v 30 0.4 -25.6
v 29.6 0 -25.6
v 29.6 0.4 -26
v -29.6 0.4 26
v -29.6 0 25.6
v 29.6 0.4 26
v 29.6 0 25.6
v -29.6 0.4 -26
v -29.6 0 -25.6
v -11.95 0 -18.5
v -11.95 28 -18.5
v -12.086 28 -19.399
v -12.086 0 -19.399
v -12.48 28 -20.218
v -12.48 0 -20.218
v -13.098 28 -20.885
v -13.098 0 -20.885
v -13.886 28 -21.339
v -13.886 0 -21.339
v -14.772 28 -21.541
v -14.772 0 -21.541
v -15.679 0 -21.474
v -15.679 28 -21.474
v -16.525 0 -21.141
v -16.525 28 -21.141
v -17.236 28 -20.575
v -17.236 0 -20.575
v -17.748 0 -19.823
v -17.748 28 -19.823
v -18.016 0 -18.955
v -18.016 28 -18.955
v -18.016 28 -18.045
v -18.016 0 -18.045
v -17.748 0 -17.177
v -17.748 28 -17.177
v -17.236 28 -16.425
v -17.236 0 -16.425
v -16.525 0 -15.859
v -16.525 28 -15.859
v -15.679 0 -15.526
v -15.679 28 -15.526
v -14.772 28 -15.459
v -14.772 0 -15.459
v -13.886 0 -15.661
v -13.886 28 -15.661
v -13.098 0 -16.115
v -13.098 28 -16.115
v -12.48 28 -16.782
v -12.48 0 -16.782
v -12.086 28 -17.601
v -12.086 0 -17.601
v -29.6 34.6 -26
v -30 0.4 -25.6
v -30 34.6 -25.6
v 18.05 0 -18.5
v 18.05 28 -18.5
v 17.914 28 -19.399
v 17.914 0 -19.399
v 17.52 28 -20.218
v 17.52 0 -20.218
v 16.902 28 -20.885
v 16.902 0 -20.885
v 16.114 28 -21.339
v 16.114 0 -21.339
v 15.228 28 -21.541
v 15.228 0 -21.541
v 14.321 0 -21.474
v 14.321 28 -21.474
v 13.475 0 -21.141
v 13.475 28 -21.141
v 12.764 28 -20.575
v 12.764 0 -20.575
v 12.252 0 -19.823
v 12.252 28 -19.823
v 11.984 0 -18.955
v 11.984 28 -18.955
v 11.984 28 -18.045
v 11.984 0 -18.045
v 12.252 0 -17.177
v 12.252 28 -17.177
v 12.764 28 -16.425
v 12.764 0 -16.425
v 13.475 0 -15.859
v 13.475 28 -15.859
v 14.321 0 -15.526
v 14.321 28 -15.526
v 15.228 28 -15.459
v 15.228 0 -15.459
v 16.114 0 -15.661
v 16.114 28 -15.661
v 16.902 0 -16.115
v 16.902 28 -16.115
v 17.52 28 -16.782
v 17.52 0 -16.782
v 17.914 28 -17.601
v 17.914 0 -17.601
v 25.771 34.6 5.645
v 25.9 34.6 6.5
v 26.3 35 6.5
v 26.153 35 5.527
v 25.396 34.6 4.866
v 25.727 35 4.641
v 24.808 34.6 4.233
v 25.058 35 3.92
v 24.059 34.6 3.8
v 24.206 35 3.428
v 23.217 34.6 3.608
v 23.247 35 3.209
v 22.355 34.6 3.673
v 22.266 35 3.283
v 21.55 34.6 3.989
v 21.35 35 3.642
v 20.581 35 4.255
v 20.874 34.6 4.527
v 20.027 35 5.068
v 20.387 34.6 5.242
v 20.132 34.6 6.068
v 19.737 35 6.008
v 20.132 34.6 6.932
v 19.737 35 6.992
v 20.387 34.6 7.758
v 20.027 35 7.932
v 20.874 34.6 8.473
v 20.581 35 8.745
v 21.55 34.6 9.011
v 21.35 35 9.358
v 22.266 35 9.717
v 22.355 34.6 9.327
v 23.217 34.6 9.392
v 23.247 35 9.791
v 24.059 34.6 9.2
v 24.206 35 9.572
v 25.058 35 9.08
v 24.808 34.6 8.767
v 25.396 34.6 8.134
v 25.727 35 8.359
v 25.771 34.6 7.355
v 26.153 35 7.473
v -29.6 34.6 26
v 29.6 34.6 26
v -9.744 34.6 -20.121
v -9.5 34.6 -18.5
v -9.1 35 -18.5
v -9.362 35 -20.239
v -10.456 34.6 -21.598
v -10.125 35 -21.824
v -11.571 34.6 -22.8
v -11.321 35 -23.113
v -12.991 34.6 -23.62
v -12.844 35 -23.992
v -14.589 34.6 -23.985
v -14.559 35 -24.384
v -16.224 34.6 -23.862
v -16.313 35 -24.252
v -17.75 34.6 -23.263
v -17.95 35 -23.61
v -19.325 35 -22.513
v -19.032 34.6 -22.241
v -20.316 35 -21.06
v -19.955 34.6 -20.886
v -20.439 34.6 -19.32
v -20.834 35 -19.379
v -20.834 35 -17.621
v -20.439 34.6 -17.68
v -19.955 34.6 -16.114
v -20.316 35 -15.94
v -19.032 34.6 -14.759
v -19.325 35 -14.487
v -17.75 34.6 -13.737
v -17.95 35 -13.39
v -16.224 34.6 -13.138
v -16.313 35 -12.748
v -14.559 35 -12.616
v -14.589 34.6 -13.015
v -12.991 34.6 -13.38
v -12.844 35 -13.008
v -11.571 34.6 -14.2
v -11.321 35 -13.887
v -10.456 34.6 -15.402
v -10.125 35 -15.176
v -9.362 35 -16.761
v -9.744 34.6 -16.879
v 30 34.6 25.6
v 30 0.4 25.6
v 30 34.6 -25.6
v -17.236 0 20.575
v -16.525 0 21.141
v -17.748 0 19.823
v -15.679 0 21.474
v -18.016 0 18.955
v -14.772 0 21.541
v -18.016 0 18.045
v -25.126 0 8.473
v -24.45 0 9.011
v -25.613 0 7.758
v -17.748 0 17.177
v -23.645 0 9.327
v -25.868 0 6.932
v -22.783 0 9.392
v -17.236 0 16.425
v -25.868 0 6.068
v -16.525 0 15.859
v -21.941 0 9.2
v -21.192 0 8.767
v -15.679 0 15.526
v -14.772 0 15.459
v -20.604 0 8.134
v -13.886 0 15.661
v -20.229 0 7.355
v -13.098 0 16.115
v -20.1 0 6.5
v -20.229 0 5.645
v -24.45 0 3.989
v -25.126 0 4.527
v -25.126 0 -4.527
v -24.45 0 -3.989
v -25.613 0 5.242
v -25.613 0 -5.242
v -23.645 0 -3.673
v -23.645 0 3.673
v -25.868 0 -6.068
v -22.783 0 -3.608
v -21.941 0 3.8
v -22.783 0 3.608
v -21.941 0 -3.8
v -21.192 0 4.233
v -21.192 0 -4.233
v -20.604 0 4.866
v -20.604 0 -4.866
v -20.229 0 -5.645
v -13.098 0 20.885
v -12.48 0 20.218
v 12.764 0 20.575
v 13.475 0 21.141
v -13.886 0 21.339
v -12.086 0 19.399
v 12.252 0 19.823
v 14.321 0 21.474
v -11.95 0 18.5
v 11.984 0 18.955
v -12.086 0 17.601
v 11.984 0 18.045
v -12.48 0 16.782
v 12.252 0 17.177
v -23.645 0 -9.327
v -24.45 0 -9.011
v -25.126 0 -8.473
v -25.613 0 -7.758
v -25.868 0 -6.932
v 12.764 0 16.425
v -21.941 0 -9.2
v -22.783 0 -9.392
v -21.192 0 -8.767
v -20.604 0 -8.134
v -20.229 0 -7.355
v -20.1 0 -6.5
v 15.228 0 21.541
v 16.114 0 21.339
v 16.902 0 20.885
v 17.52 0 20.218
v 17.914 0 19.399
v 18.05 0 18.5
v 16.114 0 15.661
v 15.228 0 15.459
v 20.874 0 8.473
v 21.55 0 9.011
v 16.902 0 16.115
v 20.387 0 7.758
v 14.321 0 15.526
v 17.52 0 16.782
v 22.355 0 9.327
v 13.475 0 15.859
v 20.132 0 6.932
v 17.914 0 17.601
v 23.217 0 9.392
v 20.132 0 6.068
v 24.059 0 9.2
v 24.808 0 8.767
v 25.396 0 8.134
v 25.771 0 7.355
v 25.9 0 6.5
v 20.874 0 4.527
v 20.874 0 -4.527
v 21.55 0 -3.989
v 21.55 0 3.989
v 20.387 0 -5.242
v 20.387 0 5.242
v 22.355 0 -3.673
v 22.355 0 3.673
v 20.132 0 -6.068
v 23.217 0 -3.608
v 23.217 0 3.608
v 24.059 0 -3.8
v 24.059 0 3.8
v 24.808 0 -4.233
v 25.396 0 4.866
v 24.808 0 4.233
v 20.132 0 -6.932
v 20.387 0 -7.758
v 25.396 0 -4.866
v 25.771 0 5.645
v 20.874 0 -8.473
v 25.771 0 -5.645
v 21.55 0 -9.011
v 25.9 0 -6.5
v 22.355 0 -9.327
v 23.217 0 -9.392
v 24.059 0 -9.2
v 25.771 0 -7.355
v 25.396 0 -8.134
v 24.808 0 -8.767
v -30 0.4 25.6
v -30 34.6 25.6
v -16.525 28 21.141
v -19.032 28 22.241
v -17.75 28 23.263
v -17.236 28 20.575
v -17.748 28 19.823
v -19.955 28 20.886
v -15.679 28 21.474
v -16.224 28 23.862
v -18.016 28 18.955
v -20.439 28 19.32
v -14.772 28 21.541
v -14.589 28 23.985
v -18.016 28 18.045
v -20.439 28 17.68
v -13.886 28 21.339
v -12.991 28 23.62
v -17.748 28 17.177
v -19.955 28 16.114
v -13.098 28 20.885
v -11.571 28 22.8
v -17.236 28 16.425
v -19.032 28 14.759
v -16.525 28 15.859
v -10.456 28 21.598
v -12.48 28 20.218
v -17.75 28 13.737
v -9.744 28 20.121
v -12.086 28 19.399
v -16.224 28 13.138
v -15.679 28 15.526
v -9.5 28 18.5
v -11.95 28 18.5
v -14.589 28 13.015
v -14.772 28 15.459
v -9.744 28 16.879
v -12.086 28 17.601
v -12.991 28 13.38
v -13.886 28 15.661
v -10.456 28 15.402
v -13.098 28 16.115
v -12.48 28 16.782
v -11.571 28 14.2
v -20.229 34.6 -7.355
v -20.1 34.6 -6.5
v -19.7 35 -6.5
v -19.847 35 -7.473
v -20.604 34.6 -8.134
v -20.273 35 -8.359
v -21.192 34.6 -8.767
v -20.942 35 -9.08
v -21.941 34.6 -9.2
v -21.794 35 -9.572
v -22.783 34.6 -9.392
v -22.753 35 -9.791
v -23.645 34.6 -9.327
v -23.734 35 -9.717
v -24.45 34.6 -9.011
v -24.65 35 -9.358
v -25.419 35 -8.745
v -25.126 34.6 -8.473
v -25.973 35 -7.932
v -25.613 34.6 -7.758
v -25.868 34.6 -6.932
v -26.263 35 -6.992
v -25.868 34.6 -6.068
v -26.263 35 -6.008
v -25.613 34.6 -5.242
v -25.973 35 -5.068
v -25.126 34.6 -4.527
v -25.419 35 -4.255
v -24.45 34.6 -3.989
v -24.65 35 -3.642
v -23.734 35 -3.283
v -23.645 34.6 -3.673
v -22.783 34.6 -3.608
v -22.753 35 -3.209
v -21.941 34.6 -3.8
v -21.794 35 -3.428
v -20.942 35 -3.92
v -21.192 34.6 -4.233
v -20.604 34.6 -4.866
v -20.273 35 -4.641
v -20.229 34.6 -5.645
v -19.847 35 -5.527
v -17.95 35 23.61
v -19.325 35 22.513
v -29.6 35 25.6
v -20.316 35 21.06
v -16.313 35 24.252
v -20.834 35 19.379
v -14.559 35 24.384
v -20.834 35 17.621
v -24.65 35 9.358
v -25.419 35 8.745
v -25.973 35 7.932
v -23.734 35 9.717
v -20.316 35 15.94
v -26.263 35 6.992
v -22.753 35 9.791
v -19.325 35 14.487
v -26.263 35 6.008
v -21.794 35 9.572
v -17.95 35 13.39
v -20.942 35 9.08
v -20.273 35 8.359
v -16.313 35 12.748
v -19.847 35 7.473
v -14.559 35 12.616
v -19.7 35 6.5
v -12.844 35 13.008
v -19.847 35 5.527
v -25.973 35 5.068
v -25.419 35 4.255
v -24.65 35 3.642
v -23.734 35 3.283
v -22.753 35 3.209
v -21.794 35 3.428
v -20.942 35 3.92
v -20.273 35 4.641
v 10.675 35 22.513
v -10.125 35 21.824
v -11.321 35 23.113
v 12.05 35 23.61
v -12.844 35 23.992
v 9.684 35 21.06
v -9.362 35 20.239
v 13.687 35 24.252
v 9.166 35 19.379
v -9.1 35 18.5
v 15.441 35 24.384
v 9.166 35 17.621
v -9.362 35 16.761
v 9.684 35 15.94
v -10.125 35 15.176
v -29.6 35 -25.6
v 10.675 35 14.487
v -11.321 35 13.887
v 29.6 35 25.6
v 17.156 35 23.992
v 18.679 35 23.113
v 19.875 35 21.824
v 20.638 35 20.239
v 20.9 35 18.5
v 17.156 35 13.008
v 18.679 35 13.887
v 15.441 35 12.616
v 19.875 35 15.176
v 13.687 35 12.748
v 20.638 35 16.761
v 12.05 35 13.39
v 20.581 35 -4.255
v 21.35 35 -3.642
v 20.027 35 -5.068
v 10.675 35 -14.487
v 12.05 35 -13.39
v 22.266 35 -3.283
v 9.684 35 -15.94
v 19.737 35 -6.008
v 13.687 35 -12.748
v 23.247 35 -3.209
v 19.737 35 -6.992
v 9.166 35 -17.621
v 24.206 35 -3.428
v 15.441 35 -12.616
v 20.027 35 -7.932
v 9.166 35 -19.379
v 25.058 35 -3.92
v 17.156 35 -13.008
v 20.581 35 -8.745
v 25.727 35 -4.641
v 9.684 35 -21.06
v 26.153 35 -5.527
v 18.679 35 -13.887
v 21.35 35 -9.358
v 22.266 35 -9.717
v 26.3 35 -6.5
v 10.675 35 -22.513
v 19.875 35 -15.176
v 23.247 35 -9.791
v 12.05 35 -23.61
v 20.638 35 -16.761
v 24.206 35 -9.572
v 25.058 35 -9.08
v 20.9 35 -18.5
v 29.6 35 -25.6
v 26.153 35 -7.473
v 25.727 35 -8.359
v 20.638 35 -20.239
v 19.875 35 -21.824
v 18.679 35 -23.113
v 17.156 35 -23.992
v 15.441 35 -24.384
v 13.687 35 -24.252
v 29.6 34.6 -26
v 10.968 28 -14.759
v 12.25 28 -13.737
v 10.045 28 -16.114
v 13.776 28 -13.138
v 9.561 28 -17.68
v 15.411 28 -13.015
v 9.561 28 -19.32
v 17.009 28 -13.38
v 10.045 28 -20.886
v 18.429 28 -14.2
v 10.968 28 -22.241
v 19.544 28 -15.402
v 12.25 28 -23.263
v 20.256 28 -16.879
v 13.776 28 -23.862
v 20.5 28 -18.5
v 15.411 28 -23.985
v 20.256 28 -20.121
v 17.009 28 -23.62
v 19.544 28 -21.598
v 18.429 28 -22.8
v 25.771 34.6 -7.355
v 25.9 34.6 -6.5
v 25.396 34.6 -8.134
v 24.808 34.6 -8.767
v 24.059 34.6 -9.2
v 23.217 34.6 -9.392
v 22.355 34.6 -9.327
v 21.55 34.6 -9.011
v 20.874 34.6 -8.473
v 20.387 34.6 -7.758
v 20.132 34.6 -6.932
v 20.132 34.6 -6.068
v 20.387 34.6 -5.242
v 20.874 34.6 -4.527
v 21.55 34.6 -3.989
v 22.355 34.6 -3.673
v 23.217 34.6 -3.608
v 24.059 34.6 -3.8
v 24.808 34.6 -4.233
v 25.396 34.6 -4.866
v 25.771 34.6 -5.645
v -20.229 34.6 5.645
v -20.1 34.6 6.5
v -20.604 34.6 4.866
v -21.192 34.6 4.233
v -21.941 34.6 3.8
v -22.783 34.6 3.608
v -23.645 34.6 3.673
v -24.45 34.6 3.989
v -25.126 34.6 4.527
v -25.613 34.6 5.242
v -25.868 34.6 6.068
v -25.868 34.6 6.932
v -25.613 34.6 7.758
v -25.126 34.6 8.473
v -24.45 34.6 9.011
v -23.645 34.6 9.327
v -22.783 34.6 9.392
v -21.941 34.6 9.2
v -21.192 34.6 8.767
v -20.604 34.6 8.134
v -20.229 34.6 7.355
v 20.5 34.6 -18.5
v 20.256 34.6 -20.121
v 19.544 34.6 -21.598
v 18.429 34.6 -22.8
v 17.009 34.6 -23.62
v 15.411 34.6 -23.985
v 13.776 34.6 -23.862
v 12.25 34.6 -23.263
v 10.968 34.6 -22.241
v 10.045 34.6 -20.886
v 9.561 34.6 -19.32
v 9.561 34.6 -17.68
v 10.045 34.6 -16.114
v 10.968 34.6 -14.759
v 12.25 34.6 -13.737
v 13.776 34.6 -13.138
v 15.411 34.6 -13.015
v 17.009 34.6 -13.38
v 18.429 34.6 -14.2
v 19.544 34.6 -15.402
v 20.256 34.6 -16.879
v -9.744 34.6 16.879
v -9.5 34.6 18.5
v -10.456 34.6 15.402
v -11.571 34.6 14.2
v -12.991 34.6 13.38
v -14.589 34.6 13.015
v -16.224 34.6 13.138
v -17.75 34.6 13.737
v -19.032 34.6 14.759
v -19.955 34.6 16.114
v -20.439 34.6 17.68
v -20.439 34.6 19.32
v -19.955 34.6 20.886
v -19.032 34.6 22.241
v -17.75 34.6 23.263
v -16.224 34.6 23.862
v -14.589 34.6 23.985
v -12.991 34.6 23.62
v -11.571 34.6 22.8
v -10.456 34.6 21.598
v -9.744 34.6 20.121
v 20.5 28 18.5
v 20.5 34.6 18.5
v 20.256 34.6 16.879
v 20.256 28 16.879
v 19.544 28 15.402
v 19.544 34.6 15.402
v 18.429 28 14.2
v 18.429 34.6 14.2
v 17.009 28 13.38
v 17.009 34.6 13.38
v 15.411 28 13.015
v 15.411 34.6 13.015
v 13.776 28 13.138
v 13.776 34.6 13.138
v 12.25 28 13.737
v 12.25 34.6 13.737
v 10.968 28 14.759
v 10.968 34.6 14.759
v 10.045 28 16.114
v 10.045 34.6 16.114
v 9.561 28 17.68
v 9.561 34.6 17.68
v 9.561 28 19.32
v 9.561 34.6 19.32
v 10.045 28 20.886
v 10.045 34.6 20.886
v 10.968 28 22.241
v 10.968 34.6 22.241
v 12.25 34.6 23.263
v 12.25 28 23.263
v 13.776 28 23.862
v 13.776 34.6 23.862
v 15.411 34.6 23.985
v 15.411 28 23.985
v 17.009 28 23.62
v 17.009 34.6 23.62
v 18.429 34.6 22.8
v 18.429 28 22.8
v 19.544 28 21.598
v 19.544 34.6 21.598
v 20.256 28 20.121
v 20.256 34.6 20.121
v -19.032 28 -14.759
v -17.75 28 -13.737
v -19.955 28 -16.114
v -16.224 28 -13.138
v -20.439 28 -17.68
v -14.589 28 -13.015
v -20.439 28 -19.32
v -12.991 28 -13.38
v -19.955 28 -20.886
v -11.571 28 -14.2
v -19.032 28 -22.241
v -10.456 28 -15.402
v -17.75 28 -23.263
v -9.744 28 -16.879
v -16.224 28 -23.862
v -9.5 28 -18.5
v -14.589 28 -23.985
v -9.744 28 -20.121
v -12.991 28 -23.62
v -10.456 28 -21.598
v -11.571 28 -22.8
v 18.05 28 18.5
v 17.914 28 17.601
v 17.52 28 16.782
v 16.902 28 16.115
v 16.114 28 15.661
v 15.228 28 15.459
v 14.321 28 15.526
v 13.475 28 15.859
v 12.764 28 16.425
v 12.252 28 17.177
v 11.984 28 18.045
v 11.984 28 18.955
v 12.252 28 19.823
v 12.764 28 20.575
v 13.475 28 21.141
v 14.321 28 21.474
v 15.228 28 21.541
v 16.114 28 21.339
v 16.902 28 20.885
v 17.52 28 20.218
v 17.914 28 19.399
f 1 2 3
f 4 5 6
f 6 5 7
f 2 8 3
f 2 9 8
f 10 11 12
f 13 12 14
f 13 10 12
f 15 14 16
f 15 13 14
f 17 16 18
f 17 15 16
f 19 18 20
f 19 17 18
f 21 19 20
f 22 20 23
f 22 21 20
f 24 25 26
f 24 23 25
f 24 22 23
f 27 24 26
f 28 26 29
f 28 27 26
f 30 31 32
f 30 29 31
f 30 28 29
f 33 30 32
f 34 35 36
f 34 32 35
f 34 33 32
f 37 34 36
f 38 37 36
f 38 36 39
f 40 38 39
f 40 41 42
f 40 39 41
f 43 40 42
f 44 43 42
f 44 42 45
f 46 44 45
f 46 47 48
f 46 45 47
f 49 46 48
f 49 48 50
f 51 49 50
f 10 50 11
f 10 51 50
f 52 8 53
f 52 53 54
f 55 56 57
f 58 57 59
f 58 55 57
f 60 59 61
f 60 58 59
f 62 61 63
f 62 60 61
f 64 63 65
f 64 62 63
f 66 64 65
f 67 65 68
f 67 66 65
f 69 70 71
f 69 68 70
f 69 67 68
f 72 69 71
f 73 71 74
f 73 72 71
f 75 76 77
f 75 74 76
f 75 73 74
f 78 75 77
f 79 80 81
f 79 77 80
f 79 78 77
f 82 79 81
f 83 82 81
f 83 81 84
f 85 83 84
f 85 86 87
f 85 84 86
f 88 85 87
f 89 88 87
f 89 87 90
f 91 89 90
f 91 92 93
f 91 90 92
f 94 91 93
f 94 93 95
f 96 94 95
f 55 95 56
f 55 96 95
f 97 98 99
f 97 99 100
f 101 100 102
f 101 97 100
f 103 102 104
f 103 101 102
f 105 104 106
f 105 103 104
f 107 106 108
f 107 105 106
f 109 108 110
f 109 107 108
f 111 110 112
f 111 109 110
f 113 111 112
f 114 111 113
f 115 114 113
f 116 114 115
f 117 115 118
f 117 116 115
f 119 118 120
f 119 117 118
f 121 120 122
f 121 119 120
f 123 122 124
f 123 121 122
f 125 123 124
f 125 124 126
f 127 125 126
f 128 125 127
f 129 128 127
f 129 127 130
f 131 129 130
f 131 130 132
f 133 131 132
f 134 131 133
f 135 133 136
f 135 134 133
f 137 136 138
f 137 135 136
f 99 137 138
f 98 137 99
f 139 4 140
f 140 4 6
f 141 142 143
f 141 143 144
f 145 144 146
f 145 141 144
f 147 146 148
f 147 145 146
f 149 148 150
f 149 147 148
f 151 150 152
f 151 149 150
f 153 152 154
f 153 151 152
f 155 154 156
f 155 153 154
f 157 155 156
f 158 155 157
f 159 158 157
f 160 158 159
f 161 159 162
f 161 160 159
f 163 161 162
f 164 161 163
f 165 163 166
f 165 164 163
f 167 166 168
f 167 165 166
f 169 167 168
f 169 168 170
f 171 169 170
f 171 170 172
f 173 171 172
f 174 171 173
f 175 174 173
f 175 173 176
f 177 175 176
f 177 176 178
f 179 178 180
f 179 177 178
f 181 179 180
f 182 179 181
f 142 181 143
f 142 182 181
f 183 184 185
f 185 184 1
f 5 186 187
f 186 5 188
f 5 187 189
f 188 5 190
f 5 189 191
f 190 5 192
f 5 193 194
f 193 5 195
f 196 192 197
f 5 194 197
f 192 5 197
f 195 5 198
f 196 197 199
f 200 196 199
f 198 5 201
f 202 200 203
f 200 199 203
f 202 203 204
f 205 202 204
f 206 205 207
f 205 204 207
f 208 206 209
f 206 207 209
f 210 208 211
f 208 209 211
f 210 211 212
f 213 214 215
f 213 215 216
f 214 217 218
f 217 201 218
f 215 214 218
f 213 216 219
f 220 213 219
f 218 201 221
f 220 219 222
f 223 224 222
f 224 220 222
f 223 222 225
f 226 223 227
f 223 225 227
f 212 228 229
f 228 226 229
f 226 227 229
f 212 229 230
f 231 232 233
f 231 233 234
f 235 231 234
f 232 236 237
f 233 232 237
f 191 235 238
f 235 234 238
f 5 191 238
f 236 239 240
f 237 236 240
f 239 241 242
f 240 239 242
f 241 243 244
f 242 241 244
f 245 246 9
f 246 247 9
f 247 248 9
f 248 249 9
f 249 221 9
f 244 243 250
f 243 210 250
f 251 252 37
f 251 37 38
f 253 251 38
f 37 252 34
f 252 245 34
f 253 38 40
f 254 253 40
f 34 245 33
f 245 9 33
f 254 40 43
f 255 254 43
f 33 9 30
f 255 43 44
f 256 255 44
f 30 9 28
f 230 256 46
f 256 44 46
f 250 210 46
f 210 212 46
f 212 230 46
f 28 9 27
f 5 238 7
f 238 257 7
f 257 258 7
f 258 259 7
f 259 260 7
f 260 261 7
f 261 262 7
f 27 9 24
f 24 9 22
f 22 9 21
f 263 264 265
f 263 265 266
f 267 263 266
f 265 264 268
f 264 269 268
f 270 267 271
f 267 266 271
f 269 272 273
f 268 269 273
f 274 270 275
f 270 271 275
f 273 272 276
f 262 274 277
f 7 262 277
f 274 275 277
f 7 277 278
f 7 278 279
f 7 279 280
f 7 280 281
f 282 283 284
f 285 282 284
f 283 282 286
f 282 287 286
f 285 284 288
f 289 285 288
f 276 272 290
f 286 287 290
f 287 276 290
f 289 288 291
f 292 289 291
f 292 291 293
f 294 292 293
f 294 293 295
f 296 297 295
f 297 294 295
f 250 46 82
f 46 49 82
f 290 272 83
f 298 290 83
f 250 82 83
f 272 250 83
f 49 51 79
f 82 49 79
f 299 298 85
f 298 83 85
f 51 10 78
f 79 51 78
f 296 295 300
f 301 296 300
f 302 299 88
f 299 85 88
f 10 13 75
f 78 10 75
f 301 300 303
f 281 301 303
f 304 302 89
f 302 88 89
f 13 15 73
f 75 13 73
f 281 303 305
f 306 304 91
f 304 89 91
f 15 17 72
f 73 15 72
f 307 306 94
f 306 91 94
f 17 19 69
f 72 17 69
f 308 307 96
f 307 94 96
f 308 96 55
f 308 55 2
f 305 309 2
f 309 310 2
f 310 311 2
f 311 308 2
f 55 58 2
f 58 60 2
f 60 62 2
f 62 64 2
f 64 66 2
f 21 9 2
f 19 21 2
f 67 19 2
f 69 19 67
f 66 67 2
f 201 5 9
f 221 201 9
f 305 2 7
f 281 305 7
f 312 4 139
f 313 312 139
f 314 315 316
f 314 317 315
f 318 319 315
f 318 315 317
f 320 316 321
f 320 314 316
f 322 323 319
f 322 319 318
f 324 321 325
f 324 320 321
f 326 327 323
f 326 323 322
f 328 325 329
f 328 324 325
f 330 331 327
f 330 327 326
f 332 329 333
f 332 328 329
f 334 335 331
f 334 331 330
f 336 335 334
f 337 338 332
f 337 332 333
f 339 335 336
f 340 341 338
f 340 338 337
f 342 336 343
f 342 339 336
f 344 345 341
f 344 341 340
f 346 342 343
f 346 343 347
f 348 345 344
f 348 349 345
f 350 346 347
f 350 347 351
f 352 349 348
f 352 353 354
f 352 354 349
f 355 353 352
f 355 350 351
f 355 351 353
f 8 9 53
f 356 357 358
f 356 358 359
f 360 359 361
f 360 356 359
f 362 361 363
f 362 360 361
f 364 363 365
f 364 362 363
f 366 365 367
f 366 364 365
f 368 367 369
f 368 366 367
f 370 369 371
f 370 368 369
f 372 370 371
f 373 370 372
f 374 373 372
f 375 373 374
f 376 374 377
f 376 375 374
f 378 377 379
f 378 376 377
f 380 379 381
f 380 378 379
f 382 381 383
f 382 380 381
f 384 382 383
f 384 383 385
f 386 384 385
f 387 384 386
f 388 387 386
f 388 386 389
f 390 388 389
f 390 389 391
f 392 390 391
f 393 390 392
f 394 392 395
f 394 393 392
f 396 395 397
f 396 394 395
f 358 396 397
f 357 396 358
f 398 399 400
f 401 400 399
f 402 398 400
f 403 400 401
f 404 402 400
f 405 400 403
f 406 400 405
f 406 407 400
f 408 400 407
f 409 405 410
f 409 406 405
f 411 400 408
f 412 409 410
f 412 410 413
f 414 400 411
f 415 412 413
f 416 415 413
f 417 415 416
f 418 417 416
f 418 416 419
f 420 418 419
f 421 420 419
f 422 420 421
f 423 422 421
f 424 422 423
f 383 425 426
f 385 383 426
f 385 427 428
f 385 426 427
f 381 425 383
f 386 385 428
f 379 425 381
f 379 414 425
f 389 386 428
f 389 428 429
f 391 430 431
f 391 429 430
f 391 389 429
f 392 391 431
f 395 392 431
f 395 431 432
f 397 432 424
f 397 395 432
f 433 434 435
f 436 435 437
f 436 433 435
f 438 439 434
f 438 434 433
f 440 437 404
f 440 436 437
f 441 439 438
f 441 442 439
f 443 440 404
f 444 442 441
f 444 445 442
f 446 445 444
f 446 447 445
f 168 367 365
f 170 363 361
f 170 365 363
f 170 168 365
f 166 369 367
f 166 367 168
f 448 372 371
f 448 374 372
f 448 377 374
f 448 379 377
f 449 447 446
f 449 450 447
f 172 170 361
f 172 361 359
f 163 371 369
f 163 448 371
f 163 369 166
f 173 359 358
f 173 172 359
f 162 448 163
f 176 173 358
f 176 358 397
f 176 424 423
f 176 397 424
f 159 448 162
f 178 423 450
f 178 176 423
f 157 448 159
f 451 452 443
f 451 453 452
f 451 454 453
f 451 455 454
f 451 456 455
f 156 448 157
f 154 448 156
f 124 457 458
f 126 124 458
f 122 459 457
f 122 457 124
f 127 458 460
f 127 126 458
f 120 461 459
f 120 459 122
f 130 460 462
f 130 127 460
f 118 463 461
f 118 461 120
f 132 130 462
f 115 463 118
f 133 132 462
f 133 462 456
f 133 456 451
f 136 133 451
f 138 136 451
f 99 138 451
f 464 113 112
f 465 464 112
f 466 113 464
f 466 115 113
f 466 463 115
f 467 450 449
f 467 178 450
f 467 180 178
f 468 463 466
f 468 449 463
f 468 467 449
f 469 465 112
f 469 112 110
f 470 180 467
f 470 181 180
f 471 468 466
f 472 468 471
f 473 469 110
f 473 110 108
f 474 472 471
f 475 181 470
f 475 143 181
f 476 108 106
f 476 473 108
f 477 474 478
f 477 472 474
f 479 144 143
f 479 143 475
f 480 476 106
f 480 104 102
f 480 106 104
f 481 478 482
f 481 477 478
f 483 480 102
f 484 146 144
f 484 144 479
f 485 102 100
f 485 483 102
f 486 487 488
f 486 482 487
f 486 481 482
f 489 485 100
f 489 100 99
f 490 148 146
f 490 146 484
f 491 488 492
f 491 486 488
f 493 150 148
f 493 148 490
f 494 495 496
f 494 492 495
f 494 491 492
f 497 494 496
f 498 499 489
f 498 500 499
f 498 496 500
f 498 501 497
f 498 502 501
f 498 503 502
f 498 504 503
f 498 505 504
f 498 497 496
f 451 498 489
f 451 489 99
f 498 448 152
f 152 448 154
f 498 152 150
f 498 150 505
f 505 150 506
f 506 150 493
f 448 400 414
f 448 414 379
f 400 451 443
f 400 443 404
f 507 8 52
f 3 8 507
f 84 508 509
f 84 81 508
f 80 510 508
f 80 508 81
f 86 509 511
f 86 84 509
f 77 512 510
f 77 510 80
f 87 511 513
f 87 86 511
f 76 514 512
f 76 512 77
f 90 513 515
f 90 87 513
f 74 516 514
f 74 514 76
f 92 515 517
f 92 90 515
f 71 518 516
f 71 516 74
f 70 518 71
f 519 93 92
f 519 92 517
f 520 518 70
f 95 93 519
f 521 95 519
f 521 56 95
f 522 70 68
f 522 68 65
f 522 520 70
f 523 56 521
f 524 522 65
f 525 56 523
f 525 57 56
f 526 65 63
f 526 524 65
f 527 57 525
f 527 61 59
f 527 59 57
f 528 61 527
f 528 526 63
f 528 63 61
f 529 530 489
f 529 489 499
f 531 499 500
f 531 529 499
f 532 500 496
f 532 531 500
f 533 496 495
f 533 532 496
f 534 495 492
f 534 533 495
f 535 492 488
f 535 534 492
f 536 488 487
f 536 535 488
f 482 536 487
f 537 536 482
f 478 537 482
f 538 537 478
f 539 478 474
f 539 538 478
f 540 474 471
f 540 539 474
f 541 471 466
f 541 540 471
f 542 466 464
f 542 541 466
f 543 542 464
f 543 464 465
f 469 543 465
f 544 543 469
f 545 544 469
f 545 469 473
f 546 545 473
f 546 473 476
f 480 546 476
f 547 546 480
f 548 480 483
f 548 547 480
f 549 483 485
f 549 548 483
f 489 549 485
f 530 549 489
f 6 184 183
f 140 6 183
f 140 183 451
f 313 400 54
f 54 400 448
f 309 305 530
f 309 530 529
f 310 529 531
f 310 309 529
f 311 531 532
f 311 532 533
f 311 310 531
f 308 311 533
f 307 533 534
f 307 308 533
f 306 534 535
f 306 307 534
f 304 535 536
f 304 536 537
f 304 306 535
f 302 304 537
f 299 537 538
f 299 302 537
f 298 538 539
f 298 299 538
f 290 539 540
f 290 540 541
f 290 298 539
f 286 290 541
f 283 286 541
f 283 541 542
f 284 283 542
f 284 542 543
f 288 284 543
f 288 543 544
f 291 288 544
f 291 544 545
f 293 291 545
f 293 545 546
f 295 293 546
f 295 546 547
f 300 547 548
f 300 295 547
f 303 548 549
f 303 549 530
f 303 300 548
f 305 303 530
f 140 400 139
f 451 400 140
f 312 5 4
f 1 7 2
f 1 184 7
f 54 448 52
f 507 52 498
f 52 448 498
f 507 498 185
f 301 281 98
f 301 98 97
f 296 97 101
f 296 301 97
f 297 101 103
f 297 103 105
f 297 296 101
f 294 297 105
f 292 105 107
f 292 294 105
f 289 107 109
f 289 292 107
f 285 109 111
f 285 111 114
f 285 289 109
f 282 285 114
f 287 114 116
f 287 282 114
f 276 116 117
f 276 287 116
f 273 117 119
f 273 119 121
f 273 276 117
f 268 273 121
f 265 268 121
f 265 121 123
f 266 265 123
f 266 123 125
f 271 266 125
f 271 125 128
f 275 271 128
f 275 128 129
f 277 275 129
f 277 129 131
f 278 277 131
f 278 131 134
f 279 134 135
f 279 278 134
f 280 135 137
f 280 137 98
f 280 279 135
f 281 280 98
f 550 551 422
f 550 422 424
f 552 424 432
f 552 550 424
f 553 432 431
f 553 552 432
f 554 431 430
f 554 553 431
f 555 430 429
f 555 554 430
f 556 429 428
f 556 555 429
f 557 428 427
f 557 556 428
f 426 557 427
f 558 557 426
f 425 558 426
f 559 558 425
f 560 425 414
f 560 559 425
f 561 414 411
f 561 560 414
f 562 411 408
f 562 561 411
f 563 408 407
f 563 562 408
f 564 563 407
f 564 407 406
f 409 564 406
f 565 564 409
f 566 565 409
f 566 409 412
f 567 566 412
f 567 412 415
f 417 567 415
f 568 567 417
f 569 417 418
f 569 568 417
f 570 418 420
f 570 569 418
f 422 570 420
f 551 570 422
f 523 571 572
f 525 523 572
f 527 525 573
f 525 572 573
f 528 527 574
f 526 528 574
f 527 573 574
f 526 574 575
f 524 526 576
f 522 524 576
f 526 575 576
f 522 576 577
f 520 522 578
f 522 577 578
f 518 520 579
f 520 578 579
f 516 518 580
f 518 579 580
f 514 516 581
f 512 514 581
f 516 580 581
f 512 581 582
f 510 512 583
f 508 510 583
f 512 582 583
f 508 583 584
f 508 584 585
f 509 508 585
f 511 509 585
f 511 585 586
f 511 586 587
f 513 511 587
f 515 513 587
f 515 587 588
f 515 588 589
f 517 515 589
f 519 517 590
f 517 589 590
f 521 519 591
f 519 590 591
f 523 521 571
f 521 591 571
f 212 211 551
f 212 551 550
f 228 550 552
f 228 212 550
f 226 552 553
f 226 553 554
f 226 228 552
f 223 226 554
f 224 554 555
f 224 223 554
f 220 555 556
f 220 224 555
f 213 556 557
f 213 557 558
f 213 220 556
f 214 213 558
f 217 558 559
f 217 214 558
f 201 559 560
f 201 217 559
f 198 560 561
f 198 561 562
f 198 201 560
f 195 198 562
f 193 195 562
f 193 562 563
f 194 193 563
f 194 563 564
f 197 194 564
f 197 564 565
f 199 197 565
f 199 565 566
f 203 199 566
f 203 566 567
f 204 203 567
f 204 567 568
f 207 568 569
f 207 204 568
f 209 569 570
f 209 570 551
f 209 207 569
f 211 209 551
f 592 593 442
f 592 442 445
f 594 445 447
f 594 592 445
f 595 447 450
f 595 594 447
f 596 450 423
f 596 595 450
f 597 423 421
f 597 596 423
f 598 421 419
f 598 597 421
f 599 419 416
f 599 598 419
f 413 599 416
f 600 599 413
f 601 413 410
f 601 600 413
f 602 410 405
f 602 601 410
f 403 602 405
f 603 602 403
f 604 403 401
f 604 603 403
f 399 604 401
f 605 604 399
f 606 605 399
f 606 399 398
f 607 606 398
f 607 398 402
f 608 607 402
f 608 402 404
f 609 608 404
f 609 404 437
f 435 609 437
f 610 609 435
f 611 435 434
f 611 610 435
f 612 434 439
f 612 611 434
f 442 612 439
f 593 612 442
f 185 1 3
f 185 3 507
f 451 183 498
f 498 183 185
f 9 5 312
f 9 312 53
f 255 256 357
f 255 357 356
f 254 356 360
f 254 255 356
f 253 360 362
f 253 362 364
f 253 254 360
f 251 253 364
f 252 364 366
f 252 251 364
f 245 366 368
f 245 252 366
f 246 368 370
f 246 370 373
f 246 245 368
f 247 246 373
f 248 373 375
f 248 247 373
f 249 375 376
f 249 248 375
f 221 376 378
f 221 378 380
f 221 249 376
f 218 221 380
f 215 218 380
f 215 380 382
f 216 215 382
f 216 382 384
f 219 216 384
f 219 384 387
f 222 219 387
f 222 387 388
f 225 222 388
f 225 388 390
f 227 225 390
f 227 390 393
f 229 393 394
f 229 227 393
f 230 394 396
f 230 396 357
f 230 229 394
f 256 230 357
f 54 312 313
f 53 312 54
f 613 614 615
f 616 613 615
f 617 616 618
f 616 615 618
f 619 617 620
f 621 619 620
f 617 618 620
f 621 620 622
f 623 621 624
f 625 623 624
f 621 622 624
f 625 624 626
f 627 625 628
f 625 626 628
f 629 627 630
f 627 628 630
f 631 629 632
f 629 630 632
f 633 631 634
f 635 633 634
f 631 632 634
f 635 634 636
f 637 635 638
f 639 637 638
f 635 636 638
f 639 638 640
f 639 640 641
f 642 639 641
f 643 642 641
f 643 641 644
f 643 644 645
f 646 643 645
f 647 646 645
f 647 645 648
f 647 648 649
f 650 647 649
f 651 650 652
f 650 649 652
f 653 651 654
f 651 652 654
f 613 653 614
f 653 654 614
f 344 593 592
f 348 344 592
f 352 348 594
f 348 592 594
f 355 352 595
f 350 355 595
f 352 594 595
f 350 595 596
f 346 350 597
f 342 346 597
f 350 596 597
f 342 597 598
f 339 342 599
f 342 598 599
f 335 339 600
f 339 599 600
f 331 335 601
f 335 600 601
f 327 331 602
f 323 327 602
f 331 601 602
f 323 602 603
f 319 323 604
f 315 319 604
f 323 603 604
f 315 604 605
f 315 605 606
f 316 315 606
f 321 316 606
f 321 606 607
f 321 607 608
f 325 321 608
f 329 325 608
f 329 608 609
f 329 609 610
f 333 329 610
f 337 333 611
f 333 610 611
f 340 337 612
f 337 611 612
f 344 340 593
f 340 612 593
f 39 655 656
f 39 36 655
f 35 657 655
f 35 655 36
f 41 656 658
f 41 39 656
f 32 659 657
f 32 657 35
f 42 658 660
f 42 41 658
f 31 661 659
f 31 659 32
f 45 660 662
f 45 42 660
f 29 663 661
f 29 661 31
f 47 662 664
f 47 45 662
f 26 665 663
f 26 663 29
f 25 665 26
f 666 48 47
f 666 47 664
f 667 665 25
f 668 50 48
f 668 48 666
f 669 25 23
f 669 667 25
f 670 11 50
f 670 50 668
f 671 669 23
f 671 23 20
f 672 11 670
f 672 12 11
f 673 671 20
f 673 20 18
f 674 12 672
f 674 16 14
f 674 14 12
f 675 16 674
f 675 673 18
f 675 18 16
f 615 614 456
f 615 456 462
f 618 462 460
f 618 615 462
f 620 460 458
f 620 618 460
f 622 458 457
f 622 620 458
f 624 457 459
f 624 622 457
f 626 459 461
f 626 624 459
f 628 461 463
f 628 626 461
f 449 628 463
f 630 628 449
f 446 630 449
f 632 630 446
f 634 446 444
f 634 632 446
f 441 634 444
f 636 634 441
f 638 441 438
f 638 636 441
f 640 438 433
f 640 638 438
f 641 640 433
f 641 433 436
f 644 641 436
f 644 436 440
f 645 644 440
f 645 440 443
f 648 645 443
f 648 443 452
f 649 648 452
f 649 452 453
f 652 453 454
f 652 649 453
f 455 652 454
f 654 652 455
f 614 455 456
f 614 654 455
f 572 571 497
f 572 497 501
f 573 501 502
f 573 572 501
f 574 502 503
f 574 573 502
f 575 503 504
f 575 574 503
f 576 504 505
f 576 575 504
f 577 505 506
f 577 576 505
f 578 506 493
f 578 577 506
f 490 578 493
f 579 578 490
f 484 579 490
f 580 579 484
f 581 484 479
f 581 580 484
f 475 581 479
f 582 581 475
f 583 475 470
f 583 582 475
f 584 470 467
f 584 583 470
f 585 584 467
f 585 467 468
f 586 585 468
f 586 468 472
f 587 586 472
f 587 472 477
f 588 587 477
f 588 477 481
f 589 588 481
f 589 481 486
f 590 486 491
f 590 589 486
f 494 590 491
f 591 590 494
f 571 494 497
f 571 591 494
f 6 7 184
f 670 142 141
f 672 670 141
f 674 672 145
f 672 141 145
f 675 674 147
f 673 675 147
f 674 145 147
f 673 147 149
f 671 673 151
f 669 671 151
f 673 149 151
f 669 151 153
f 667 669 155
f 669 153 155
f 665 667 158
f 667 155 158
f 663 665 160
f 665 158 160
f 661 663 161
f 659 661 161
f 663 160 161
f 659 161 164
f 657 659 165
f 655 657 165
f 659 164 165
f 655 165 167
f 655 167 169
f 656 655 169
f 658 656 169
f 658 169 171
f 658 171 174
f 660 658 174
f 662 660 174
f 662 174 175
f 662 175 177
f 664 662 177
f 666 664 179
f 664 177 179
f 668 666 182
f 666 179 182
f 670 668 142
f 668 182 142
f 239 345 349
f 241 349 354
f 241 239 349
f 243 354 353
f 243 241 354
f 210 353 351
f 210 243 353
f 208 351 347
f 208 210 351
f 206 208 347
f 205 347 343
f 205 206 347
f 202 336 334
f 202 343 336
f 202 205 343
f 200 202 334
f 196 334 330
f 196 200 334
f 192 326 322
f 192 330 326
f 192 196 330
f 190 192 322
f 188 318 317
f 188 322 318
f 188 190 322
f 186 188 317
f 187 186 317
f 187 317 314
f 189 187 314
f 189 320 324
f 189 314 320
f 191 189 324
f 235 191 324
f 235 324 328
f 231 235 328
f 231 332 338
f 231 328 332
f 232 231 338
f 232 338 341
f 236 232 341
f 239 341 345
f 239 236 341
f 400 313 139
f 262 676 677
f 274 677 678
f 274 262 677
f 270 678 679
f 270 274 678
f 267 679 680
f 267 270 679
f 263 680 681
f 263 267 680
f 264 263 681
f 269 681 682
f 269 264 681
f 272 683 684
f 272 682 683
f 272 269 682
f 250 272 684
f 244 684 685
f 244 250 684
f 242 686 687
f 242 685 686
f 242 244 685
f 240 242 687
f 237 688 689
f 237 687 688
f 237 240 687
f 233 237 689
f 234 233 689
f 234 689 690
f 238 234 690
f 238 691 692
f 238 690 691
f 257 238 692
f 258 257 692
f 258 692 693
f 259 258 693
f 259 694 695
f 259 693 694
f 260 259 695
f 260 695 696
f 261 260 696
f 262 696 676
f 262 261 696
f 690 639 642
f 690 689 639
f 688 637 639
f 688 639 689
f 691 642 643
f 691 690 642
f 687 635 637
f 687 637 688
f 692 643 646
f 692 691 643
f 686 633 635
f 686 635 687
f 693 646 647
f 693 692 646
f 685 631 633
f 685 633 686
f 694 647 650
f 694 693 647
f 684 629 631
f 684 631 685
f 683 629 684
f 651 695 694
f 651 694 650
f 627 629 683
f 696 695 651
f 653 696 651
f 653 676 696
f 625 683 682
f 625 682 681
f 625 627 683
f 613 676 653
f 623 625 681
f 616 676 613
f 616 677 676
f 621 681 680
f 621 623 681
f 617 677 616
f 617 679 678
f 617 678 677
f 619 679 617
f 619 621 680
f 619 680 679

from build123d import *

# Parameters (mm, degrees)
SKETCH1_W           = 60
SKETCH1_H           = 52
SKETCH1_R           = 2.9
SKETCH1_R_2         = 3.05
BOSS_EXTRUDE1_DEPTH = 35
SKETCH2_R           = 5.5
CUT_EXTRUDE1_DEPTH  = 7
CHAMFER1_SIZE       = 0.4


with BuildPart() as part:
    # Sketch1 → Boss-Extrude1 (new body)
    with BuildSketch(Plane(origin=(0, 0, 0), x_dir=(1, 0, 0), z_dir=(0, 1, 0))):
        Rectangle(SKETCH1_W, SKETCH1_H)
        with Locations((-23, 6.5)):
            Circle(SKETCH1_R, mode=Mode.SUBTRACT)
        with Locations((23, 6.5)):
            Circle(SKETCH1_R, mode=Mode.SUBTRACT)
        with Locations((23, -6.5)):
            Circle(SKETCH1_R, mode=Mode.SUBTRACT)
        with Locations((-23, -6.5)):
            Circle(SKETCH1_R, mode=Mode.SUBTRACT)
        with Locations((-15, 18.5)):
            Circle(SKETCH1_R_2, mode=Mode.SUBTRACT)
        with Locations((15, 18.5)):
            Circle(SKETCH1_R_2, mode=Mode.SUBTRACT)
        with Locations((15, -18.5)):
            Circle(SKETCH1_R_2, mode=Mode.SUBTRACT)
        with Locations((-15, -18.5)):
            Circle(SKETCH1_R_2, mode=Mode.SUBTRACT)
    extrude(amount=BOSS_EXTRUDE1_DEPTH)

    # Sketch2 → Cut-Extrude1 (cut)
    with BuildSketch(Plane(origin=(0, 35, 0), x_dir=(1, 0, 0), z_dir=(0, 1, 0))):
        with Locations((-15, 18.5)):
            Circle(SKETCH2_R)
        with Locations((15, 18.5)):
            Circle(SKETCH2_R)
        with Locations((15, -18.5)):
            Circle(SKETCH2_R)
        with Locations((-15, -18.5)):
            Circle(SKETCH2_R)
    extrude(amount=-CUT_EXTRUDE1_DEPTH, mode=Mode.SUBTRACT)

    # Chamfer1
    chamfer1_edges = [part.edges().sort_by_distance(p)[0] for p in [
        (-25.9, 35, -6.5),
        (30, 35, 0),
        (20.1, 35, -6.5),
        (0, 35, -26),
        (20.1, 35, 6.5),
        (-25.9, 35, 6.5),
        (-30, 35, 0),
        (0, 0, -26),
        (-20.5, 35, 18.5),
        (30, 0, 0),
        (9.5, 35, 18.5),
        (9.5, 35, -18.5),
        (0, 0, 26),
        (-20.5, 35, -18.5),
        (-30, 0, 0),
        (-30, 17.5, -26),
        (30, 17.5, -26),
        (30, 17.5, 26),
        (-30, 17.5, 26),
        (0, 35, 26),
    ]]
    chamfer(chamfer1_edges, length=CHAMFER1_SIZE)


solid = part.part
